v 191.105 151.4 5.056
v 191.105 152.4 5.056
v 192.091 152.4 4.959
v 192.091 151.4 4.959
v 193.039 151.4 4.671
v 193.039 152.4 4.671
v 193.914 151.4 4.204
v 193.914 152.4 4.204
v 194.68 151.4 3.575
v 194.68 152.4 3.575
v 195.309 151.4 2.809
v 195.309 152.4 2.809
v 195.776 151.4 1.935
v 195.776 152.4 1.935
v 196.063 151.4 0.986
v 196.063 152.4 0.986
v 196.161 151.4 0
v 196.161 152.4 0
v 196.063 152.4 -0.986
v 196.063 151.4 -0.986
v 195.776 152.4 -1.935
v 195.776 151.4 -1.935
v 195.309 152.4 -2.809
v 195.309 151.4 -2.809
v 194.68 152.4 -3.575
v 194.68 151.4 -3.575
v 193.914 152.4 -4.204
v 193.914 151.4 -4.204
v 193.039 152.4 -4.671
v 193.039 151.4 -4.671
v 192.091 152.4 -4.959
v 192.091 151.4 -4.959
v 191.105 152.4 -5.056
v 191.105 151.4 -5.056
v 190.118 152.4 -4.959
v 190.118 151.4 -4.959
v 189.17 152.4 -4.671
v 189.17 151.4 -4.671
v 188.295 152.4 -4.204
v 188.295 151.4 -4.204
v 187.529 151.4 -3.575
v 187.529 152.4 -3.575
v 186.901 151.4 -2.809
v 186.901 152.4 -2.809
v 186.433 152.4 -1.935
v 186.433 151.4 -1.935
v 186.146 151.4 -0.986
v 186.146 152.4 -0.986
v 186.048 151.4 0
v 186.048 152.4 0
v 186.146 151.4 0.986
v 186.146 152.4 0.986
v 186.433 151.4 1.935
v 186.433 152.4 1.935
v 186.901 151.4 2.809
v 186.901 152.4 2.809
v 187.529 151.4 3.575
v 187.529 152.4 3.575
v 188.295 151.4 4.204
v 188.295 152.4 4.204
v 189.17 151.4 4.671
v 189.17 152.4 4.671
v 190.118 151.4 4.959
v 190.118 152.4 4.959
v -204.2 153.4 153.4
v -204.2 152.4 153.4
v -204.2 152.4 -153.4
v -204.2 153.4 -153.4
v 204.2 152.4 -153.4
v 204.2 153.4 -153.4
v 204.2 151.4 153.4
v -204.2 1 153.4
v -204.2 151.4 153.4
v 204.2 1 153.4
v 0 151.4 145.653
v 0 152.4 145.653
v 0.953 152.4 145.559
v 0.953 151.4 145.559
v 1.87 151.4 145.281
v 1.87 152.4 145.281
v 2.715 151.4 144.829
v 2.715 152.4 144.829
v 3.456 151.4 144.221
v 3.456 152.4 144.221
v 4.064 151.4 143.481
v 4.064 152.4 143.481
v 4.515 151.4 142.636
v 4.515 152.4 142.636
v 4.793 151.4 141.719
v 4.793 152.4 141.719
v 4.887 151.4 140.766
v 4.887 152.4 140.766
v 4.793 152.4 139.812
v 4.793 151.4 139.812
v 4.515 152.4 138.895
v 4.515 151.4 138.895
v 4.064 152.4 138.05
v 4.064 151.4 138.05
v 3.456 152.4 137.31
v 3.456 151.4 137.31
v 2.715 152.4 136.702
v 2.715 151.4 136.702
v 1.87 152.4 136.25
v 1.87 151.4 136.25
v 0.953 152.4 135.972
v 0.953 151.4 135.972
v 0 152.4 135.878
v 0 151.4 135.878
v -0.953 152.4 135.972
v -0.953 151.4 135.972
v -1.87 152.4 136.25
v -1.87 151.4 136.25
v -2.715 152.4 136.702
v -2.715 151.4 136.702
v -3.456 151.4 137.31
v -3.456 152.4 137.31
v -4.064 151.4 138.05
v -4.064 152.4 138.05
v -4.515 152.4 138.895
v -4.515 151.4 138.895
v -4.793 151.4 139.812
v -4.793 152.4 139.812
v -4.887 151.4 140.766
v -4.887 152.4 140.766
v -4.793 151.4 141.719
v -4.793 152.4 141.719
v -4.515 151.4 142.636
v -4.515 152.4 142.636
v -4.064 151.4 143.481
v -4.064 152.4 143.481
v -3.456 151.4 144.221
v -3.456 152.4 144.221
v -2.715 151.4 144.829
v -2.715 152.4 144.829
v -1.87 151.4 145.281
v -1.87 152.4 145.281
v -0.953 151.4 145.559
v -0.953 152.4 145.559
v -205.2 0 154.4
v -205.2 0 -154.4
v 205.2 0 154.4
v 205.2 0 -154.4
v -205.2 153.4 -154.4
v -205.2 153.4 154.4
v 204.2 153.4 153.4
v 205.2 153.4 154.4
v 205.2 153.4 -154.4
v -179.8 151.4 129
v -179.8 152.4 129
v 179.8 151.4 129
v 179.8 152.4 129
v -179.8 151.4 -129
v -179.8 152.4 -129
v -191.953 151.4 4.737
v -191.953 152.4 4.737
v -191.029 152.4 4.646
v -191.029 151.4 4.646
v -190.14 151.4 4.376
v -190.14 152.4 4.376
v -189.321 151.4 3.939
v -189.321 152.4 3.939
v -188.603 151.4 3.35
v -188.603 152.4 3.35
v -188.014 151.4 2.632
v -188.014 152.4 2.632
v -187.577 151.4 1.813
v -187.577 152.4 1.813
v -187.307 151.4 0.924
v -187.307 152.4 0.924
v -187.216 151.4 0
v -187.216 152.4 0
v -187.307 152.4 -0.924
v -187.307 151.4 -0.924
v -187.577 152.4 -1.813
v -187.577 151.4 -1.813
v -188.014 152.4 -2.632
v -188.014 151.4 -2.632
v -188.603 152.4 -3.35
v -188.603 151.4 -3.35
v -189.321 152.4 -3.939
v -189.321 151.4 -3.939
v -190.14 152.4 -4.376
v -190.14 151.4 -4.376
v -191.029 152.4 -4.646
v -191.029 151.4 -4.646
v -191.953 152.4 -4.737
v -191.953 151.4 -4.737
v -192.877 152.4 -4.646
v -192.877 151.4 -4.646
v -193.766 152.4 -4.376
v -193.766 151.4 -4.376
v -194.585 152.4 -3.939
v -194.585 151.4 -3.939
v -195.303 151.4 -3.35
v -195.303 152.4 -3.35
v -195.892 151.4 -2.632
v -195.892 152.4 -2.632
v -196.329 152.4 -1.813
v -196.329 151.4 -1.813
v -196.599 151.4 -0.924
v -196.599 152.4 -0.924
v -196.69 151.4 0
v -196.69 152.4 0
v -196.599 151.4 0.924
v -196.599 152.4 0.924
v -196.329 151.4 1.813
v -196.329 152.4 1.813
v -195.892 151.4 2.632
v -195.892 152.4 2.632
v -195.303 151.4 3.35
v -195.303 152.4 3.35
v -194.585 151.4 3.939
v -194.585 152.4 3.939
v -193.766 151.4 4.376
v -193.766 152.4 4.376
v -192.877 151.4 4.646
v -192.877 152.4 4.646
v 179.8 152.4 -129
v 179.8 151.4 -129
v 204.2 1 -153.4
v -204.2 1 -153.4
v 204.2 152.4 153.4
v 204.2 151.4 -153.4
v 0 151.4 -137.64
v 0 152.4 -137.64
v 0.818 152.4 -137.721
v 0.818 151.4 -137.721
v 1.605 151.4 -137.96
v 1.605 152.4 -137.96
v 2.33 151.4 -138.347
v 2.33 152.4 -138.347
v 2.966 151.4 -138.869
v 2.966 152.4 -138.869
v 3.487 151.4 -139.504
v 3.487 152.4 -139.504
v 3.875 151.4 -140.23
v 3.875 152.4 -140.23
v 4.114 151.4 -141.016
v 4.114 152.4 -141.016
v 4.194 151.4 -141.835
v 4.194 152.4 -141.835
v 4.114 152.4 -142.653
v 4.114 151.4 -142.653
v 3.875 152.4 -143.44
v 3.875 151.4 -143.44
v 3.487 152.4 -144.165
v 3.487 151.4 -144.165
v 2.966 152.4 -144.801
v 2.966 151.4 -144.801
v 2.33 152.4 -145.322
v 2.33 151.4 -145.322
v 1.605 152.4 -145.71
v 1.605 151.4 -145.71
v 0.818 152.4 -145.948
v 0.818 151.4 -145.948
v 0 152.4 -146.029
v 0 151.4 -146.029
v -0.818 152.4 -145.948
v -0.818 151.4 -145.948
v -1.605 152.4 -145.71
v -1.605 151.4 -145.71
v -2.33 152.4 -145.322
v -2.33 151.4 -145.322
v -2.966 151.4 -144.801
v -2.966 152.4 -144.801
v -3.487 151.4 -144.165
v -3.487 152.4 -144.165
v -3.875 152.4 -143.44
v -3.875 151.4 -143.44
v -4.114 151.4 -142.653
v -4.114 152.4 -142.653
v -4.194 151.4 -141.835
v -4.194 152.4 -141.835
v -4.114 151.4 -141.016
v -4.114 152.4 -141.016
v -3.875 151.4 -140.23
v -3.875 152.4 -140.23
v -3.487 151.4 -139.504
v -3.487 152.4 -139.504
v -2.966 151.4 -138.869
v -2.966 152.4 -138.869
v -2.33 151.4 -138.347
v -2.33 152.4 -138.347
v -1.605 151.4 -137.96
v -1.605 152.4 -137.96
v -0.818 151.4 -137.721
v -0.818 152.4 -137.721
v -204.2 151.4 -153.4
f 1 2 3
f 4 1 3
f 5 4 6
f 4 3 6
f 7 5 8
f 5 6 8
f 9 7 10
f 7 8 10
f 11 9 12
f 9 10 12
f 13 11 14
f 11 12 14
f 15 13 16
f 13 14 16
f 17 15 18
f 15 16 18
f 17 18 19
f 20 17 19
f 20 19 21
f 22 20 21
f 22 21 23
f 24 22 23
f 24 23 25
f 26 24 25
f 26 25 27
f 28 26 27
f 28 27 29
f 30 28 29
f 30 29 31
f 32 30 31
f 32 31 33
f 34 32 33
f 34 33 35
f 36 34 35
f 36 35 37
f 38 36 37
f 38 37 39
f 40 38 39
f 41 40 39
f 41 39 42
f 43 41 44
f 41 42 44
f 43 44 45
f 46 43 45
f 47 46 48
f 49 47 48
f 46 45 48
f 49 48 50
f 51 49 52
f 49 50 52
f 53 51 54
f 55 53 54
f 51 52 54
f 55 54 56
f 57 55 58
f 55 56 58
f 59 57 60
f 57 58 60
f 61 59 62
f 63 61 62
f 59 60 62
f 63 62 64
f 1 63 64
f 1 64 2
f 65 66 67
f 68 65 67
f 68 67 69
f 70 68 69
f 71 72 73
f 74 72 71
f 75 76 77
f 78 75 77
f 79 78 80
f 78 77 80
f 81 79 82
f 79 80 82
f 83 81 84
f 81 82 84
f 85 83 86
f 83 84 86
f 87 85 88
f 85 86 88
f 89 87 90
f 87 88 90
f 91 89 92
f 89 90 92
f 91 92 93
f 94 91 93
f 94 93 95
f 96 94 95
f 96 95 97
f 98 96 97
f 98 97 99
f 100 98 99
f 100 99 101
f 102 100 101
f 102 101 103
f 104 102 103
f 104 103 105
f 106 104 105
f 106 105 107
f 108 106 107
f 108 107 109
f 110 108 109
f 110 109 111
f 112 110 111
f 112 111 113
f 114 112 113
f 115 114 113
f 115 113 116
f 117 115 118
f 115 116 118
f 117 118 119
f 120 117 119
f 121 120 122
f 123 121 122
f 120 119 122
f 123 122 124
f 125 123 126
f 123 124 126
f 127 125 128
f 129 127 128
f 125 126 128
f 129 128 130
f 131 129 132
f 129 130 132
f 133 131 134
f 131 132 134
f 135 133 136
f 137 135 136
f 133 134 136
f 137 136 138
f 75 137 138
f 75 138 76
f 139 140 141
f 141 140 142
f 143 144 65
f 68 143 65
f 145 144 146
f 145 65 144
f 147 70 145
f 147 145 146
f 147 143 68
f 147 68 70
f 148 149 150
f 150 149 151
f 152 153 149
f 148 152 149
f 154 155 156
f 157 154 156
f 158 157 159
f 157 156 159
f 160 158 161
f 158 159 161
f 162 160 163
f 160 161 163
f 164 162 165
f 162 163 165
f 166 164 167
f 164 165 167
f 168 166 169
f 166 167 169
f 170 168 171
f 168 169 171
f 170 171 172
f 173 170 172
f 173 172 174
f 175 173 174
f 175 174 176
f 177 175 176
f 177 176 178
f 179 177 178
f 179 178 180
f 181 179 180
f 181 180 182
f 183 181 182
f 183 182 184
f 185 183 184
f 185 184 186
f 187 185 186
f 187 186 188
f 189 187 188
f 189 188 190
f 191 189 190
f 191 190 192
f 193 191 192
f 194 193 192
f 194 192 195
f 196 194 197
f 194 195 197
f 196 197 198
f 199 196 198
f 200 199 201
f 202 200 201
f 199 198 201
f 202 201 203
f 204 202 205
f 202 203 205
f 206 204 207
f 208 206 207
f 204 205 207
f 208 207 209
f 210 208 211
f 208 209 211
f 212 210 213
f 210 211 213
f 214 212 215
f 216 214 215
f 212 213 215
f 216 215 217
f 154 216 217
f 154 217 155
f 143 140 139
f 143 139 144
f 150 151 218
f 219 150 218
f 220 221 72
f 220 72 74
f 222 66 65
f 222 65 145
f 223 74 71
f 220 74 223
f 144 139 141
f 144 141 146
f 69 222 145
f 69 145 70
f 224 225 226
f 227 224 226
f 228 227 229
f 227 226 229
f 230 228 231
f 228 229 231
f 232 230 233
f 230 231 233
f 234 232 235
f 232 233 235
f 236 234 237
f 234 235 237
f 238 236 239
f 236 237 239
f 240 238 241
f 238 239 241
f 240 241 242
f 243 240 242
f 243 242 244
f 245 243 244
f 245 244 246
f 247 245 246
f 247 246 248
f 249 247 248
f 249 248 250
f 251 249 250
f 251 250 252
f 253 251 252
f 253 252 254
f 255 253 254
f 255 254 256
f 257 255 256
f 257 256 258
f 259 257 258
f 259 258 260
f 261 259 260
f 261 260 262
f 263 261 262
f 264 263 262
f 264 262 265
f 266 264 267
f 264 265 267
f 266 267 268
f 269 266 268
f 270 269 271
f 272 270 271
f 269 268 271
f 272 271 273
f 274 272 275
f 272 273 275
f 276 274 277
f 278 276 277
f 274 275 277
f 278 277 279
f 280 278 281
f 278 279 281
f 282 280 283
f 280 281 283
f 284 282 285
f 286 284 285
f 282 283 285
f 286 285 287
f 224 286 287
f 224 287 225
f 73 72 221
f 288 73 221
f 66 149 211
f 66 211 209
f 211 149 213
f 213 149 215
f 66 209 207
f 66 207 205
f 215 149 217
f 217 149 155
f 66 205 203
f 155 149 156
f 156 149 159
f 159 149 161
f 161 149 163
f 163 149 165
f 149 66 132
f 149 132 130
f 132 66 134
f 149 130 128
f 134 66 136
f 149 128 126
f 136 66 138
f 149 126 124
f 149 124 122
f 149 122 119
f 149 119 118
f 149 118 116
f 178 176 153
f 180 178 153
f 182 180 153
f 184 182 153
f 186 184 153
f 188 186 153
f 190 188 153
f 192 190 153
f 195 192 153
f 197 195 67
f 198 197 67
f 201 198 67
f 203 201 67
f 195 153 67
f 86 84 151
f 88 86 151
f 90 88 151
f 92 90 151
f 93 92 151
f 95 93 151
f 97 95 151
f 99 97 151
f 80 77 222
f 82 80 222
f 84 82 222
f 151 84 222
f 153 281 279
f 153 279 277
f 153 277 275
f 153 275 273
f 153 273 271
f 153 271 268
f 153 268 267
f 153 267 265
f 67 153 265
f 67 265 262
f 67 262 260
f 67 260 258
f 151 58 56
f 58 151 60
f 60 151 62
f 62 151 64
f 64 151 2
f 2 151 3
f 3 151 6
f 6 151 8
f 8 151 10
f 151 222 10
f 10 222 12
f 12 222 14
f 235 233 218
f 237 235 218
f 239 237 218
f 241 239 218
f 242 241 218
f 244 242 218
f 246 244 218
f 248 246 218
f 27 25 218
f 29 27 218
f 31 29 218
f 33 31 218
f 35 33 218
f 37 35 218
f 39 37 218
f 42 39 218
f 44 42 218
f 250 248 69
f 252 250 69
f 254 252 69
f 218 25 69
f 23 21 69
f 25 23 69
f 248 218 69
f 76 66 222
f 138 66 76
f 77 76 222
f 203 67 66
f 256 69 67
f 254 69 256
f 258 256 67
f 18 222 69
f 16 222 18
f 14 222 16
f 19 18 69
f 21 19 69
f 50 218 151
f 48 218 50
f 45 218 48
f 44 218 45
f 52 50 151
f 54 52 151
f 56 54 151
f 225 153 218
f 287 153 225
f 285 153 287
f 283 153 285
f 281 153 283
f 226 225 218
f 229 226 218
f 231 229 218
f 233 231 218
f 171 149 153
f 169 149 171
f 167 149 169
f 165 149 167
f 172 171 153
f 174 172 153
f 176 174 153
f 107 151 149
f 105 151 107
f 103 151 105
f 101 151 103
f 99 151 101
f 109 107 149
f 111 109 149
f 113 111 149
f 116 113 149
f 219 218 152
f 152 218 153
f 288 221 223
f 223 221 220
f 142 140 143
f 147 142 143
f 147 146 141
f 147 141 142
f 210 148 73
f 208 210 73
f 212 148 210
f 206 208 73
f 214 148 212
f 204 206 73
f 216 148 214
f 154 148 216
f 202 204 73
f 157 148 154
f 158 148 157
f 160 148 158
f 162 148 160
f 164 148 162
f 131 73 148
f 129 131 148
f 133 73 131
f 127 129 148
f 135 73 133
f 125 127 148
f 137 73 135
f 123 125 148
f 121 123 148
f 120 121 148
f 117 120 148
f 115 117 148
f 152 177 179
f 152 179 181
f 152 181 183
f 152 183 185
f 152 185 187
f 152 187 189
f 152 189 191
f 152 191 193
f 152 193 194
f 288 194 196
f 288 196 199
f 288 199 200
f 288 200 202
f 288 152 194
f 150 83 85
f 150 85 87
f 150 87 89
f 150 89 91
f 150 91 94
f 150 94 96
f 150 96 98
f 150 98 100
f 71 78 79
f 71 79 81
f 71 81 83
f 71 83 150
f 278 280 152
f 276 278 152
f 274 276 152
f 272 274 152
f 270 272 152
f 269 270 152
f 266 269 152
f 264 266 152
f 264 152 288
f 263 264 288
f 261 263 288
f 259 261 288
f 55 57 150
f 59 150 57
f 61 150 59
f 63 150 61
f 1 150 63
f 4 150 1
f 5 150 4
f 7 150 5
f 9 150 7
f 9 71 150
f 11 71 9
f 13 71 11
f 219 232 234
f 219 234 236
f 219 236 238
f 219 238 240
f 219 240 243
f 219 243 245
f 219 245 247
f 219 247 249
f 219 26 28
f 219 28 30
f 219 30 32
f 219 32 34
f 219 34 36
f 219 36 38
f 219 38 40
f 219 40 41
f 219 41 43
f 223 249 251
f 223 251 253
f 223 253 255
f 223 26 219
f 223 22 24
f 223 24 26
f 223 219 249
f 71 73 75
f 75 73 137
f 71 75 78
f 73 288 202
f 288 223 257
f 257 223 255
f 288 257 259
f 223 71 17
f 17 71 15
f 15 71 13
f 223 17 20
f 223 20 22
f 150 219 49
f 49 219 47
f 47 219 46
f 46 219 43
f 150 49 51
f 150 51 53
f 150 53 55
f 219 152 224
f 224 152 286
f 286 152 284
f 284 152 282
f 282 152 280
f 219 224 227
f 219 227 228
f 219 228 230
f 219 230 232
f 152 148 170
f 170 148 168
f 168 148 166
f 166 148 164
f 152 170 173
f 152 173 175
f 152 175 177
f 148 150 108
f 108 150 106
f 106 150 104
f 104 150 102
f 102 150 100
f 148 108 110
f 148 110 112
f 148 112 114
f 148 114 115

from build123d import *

# Parameters (mm, degrees)
SKETCH1_W           = 410.4
SKETCH1_H           = 308.8
BOSS_EXTRUDE2_DEPTH = 1
SKETCH5_W           = 410.4
SKETCH5_H           = 1
BOSS_EXTRUDE4_DEPTH = 152.4
SKETCH10_W          = 1
SKETCH10_H          = 308.8
EXTRUDE_THIN2_DEPTH = 152.4
SKETCH11_W          = 1
SKETCH11_H          = 307.8
SKETCH11_W_2        = 409.4
SKETCH11_H_2        = 1
EXTRUDE_THIN3_DEPTH = 152.4
SKETCH12_W          = 410.4
SKETCH12_H          = 1
EXTRUDE_THIN4_DEPTH = 25.4
SKETCH13_W          = 308.8
SKETCH13_H          = 1
EXTRUDE_THIN5_DEPTH = 25.4
SKETCH14_W          = 410.4
SKETCH14_H          = 1
EXTRUDE_THIN6_DEPTH = 25.4
SKETCH15_W          = 308.8
SKETCH15_H          = 1
EXTRUDE_THIN7_DEPTH = 25.4
SKETCH19_R          = 5.056095902
SKETCH19_R_2        = 4.737056414
SKETCH19_R_3        = 4.194334137
SKETCH19_R_4        = 4.887308366
CUT_EXTRUDE3_DEPTH  = 10


with BuildPart() as part:
    # Sketch1 → Boss-Extrude2 (new body)
    with BuildSketch(Plane(origin=(0, 0, 0), x_dir=(1, 0, 0), z_dir=(0, 1, 0))):
        Rectangle(SKETCH1_W, SKETCH1_H)
    extrude(amount=BOSS_EXTRUDE2_DEPTH)

    # Sketch5 → Boss-Extrude4 (add)
    with BuildSketch(Plane(origin=(0, 1, 0), x_dir=(1, 0, 0), z_dir=(0, 1, 0))):
        with Locations((0, -153.9)):
            Rectangle(SKETCH5_W, SKETCH5_H)
    extrude(amount=BOSS_EXTRUDE4_DEPTH)

    # Sketch10 → Extrude-Thin2 (add)
    with BuildSketch(Plane(origin=(0, 1, 0), x_dir=(1, 0, 0), z_dir=(0, 1, 0))):
        with Locations((-204.7, 0)):
            Rectangle(SKETCH10_W, SKETCH10_H)
    extrude(amount=EXTRUDE_THIN2_DEPTH)

    # Sketch11 → Extrude-Thin3 (add)
    with BuildSketch(Plane(origin=(0, 1, 0), x_dir=(1, 0, 0), z_dir=(0, 1, 0))):
        with Locations((204.7, 0.5)):
            Rectangle(SKETCH11_W, SKETCH11_H)
        with Locations((0.5, 153.9)):
            Rectangle(SKETCH11_W_2, SKETCH11_H_2)
    extrude(amount=EXTRUDE_THIN3_DEPTH)

    # Sketch12 → Extrude-Thin4 (add)
    with BuildSketch(Plane(origin=(0, 0, -154.4), x_dir=(-1, 0, 0), z_dir=(0, 0, -1))):
        with Locations((0, 151.9)):
            Rectangle(SKETCH12_W, SKETCH12_H)
    extrude(amount=-EXTRUDE_THIN4_DEPTH)

    # Sketch13 → Extrude-Thin5 (add)
    with BuildSketch(Plane.ZY.offset(205.2)):
        with Locations((0, 151.9)):
            Rectangle(SKETCH13_W, SKETCH13_H)
    extrude(amount=-EXTRUDE_THIN5_DEPTH)

    # Sketch14 → Extrude-Thin6 (add)
    with BuildSketch(Plane.XY.offset(154.4)):
        with Locations((0, 151.9)):
            Rectangle(SKETCH14_W, SKETCH14_H)
    extrude(amount=-EXTRUDE_THIN6_DEPTH)

    # Sketch15 → Extrude-Thin7 (add)
    with BuildSketch(Plane(origin=(205.2, 0, 0), x_dir=(0, 0, -1), z_dir=(1, 0, 0))):
        with Locations((0, 151.9)):
            Rectangle(SKETCH15_W, SKETCH15_H)
    extrude(amount=-EXTRUDE_THIN7_DEPTH)

    # Sketch19 → Cut-Extrude3 (cut)
    with BuildSketch(Plane(origin=(0, 152.4, 0), x_dir=(1, 0, 0), z_dir=(0, 1, 0))):
        with Locations(Location((191.104510435, 0, 0), (0, 0, 270))):
            Circle(SKETCH19_R)
        with Locations(Location((-191.953029846, 0, 0), (0, 0, 270))):
            Circle(SKETCH19_R_2)
        with Locations(Location((0, 141.834718346, 0), (0, 0, 270))):
            Circle(SKETCH19_R_3)
        with Locations(Location((0, -140.765526806, 0), (0, 0, 270))):
            Circle(SKETCH19_R_4)
    extrude(amount=-CUT_EXTRUDE3_DEPTH, mode=Mode.SUBTRACT)


solid = part.part
